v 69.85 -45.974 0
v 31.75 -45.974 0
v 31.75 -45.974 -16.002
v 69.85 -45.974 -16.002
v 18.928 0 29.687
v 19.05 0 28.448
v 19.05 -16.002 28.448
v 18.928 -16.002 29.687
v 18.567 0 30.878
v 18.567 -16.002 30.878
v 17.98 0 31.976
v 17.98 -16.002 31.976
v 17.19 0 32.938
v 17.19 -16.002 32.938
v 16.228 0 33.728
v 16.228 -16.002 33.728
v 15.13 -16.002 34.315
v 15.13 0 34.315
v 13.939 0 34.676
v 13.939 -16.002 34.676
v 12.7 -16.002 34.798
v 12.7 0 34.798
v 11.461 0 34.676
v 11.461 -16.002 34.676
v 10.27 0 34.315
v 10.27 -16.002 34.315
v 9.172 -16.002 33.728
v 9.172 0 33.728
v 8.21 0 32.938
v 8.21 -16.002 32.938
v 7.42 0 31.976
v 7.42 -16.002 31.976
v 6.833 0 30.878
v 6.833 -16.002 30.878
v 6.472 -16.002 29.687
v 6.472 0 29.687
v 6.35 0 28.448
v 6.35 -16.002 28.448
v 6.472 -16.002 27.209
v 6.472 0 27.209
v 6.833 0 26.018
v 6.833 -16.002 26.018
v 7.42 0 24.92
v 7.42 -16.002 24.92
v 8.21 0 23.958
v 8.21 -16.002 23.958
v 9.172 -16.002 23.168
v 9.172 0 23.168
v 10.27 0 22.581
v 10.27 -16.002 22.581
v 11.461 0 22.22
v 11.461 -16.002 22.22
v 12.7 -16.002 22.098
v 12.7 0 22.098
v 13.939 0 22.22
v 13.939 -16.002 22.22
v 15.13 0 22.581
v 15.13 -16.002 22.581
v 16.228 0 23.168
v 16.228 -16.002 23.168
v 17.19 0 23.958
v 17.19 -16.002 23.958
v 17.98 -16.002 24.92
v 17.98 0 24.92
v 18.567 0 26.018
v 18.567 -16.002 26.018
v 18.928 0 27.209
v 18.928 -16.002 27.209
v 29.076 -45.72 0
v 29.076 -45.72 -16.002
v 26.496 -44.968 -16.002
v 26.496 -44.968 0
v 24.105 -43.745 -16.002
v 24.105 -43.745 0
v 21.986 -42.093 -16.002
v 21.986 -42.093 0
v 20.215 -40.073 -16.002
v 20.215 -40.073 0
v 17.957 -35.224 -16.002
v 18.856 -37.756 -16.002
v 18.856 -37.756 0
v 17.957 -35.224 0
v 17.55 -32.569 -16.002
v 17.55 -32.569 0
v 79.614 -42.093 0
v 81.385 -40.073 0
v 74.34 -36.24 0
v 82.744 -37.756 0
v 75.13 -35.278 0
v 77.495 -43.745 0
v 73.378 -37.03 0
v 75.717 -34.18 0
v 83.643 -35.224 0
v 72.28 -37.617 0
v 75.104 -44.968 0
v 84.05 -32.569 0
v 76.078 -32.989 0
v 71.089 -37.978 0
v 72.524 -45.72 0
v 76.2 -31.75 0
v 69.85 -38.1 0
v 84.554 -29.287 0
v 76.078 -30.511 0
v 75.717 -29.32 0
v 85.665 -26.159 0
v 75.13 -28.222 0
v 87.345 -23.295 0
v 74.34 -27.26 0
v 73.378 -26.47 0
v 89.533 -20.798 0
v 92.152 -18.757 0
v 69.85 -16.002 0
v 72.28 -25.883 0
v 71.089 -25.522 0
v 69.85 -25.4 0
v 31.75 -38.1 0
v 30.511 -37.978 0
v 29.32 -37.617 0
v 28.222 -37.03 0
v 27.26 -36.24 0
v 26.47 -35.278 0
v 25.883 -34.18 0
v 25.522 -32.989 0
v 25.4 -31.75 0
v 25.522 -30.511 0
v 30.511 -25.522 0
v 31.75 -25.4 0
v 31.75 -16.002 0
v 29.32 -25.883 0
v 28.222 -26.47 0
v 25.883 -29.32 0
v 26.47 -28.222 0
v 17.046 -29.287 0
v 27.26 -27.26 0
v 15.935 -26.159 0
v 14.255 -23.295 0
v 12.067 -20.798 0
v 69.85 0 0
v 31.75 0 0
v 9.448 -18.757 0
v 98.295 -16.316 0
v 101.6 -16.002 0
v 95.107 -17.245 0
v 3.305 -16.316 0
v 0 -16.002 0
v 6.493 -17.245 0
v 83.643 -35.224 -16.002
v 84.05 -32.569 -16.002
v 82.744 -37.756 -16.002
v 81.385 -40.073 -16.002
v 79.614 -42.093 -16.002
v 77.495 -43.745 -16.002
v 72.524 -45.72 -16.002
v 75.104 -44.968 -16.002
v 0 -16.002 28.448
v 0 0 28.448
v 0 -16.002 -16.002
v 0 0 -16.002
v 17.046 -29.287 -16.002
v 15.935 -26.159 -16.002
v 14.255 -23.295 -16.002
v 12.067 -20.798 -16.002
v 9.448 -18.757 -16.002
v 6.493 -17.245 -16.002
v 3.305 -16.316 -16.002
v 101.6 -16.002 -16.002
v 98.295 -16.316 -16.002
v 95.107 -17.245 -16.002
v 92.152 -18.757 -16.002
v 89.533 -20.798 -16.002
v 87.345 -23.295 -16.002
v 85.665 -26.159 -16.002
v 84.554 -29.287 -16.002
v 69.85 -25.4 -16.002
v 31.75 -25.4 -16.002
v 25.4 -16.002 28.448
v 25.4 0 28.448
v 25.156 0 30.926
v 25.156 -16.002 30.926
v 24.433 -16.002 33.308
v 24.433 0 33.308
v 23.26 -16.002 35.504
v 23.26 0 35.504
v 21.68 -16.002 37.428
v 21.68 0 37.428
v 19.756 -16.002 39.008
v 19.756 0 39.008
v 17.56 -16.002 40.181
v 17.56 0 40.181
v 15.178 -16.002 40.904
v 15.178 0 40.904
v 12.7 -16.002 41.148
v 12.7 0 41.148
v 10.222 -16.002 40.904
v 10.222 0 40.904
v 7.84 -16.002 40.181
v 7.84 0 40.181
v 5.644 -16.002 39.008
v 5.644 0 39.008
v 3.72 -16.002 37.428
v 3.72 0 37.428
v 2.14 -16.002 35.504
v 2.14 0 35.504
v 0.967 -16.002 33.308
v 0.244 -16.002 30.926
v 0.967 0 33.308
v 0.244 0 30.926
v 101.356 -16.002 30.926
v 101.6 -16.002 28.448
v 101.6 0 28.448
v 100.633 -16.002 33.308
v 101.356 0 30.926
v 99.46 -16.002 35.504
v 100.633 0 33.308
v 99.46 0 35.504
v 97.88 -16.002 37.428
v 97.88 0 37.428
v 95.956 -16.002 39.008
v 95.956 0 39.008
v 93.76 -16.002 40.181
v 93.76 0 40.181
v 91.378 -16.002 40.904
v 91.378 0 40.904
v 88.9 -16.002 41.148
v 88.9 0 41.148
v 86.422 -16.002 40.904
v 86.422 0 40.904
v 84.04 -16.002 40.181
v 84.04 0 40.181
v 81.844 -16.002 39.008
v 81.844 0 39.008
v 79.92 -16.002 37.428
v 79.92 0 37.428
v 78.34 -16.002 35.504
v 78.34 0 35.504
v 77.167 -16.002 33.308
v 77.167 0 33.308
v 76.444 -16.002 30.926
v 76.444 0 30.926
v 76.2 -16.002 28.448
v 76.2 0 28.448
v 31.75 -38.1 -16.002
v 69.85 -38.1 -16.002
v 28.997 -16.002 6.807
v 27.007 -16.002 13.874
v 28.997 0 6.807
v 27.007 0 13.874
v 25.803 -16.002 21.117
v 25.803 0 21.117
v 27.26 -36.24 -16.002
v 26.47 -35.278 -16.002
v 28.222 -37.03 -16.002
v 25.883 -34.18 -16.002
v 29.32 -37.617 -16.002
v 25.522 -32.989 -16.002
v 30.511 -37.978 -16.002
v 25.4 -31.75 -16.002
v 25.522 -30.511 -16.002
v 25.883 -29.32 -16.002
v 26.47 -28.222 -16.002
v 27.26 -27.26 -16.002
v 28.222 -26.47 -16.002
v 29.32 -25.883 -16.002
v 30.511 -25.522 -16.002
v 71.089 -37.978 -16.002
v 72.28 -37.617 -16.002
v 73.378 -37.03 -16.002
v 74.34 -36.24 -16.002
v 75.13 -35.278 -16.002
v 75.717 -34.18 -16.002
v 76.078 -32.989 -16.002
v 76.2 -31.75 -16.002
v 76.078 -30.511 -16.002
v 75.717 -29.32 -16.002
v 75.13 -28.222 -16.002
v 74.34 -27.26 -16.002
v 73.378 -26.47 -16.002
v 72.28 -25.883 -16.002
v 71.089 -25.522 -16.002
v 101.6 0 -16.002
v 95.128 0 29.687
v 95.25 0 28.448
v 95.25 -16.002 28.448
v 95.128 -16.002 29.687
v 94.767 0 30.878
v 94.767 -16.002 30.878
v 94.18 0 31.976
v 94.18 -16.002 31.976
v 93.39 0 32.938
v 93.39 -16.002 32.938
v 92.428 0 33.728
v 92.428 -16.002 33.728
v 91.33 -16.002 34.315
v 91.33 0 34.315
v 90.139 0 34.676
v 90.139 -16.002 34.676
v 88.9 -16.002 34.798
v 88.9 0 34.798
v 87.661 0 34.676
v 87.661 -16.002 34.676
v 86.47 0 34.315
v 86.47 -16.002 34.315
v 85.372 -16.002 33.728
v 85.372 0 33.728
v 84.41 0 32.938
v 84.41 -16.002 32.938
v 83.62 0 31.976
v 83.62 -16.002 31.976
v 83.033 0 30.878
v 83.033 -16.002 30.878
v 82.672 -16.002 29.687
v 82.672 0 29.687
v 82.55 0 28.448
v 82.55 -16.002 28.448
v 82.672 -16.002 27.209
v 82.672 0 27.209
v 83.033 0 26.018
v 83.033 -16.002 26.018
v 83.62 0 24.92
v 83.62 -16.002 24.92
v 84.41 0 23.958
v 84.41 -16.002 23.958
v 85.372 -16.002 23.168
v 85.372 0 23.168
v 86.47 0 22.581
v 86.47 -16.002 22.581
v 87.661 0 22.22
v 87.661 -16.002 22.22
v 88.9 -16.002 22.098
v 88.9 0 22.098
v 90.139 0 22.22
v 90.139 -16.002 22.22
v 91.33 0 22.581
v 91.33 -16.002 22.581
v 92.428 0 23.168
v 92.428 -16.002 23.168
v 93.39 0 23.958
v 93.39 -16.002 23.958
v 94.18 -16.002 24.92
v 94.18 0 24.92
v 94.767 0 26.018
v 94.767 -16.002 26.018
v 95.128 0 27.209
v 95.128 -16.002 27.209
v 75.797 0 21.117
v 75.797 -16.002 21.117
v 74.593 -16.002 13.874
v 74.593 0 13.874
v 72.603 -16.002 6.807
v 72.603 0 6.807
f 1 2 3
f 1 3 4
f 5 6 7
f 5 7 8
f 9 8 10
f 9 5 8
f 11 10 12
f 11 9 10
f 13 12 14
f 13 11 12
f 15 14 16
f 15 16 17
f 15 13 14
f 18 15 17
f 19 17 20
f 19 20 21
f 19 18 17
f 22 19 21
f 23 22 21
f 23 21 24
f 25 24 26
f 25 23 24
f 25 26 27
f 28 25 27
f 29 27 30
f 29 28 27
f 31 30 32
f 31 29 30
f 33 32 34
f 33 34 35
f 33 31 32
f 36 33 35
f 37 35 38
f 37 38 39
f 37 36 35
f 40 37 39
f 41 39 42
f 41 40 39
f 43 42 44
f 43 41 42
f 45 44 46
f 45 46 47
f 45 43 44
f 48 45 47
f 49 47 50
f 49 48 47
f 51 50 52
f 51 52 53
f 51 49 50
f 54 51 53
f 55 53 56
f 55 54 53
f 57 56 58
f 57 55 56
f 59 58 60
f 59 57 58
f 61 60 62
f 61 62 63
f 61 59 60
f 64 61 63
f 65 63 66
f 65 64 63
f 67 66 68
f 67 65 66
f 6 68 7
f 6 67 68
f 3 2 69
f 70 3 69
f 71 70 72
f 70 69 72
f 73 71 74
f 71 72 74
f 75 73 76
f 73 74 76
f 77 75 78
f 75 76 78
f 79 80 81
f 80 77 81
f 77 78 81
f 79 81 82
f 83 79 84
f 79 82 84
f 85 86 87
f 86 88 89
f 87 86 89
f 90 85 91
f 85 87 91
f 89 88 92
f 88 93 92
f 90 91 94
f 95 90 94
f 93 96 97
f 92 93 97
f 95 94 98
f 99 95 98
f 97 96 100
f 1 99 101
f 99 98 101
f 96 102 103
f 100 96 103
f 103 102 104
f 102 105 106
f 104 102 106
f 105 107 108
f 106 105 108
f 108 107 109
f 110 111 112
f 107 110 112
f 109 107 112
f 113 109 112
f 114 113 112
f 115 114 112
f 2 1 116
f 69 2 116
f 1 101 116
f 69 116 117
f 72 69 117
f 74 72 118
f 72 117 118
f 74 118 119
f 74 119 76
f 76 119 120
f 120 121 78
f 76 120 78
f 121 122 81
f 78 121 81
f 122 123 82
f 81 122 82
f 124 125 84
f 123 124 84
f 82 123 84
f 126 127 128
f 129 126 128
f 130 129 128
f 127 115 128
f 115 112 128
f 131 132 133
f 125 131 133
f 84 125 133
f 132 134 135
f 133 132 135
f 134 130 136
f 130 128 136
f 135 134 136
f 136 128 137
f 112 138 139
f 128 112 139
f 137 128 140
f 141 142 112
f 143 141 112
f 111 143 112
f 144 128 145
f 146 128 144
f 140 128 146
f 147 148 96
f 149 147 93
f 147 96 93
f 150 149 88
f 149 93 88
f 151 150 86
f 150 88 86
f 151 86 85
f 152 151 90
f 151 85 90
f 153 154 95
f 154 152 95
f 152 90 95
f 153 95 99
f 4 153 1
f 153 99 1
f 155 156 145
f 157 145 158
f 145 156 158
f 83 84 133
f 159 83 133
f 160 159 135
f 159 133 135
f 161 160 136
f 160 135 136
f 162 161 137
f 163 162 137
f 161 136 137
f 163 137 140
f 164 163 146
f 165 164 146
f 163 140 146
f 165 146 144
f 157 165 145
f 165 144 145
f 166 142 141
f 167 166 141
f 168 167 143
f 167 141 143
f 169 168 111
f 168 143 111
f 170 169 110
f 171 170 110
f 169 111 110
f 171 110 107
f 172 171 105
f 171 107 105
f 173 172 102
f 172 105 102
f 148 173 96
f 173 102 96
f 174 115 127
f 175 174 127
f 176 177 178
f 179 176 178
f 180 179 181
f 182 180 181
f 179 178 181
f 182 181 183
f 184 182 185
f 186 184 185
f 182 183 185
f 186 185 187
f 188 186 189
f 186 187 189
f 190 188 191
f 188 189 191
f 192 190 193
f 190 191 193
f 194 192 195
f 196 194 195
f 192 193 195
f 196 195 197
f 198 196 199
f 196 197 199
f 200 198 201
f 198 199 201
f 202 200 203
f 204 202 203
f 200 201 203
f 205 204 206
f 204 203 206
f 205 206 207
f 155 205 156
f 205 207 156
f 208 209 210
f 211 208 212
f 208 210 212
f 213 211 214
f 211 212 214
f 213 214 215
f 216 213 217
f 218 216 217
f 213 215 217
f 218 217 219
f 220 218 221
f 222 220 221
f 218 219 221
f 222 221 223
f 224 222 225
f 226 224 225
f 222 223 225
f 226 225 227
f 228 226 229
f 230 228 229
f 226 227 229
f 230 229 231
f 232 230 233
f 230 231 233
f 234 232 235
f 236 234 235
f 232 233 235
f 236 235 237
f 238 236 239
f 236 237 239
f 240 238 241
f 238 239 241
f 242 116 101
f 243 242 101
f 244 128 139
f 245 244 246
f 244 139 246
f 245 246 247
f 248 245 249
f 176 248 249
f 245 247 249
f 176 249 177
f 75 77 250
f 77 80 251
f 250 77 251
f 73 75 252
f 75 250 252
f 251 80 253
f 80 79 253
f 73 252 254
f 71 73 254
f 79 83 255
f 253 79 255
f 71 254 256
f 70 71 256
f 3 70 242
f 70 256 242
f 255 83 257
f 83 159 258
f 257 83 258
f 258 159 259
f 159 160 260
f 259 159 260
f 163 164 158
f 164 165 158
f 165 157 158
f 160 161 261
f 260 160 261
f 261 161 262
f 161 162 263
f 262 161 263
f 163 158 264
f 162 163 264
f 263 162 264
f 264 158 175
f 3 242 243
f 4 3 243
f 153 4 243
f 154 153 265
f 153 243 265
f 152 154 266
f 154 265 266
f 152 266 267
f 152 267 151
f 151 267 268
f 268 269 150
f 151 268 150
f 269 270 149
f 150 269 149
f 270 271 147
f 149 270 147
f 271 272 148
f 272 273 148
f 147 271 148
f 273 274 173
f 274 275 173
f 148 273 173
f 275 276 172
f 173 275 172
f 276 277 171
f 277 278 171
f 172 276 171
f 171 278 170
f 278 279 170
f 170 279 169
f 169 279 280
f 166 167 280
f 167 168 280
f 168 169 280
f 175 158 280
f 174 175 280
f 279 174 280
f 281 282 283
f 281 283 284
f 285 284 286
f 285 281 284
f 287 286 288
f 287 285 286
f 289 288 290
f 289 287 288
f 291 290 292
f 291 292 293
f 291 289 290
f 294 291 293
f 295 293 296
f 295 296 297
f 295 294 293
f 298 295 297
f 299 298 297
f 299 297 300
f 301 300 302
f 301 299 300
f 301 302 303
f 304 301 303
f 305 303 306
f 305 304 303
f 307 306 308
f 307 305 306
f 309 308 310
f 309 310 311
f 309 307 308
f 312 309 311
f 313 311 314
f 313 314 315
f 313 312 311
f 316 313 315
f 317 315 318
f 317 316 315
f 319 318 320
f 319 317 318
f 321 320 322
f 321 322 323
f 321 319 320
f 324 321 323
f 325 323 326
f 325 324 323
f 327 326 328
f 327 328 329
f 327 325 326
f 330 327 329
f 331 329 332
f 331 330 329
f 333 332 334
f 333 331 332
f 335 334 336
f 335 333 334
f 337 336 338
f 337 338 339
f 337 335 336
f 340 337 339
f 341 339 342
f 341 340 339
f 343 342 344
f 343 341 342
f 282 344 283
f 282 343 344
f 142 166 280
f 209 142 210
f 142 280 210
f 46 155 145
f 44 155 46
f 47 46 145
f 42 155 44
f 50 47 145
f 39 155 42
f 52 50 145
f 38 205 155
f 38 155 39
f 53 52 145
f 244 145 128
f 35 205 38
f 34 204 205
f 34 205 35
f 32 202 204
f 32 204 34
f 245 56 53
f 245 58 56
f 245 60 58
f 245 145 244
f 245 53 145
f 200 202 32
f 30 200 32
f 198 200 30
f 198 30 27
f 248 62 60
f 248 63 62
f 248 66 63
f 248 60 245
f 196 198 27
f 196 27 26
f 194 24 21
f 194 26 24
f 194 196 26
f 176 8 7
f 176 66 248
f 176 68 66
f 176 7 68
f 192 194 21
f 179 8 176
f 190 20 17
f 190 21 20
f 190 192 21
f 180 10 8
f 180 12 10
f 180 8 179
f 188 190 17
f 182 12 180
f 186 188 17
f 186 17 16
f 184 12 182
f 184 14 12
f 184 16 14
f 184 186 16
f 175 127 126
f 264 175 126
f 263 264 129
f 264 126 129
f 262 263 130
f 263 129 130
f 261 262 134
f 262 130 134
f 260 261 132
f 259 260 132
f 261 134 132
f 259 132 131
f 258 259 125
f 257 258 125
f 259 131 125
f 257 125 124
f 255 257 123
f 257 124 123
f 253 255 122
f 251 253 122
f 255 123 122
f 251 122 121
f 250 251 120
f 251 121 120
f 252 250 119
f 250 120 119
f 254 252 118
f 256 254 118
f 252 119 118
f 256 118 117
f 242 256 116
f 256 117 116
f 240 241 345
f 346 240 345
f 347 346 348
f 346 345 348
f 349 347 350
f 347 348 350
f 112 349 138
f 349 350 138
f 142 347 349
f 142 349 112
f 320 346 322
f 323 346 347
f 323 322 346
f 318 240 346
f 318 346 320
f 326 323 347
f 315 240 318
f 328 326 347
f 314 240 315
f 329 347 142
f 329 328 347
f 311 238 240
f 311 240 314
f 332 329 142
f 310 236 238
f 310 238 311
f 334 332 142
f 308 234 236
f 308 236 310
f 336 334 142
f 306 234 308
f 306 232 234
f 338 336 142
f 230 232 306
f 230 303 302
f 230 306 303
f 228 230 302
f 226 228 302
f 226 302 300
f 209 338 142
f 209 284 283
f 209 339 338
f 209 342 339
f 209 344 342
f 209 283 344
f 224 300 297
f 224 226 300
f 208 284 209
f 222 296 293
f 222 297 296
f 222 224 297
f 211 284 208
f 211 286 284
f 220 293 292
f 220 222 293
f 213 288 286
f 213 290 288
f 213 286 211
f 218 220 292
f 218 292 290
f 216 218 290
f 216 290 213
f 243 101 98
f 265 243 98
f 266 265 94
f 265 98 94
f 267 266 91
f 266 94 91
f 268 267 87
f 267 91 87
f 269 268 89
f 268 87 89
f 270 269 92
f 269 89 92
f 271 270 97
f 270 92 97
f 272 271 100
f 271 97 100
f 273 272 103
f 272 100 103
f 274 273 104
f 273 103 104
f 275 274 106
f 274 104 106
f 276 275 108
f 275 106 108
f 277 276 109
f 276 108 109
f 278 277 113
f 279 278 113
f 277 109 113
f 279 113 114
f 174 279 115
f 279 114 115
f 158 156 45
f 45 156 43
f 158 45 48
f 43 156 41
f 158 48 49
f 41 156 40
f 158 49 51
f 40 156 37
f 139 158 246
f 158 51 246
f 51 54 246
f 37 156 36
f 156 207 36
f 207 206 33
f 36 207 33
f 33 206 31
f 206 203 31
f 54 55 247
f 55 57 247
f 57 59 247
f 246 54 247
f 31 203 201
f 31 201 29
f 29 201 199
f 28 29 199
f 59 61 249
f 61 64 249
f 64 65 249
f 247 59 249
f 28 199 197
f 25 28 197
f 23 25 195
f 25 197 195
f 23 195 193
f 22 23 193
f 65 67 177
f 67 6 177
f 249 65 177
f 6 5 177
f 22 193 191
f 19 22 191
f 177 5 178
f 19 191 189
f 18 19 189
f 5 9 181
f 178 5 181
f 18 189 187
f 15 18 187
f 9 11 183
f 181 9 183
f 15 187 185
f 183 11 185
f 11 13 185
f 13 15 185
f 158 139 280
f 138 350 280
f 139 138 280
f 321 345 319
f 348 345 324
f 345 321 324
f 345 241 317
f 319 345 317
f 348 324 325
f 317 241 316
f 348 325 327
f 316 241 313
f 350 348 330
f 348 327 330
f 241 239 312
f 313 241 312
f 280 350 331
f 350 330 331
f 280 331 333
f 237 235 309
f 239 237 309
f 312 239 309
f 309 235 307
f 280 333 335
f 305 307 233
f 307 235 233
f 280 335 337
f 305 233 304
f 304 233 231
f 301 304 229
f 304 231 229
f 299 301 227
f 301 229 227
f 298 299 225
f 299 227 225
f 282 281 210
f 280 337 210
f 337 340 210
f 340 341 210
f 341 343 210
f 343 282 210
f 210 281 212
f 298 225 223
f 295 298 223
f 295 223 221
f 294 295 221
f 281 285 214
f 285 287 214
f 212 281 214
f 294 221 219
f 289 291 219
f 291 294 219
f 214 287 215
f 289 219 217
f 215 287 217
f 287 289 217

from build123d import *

# Parameters (mm, degrees)
F0_R     = 6.35
F1_DEPTH = 16.002
F2_DEPTH = 45.974
F4_DEPTH = 25.4
F5_DEPTH = 25.4


with BuildPart() as f1:
    # F0 (on Front) → F1 (new body)
    with BuildSketch(Plane.XZ):
        with BuildLine():
            ThreePointArc((76.2, 28.448), (74.593204, 13.873955), (69.85, 0))
            Line((69.85, 0), (101.6, 0))
            Line((101.6, 0), (101.6, 28.448))
            ThreePointArc((101.6, 28.448), (88.9, 41.148), (76.2, 28.448))
        make_face()
        with Locations((88.9, 28.448)):
            Circle(F0_R, mode=Mode.SUBTRACT)
        with BuildLine():
            Line((0, 28.448), (0, 0))
            Line((0, 0), (31.75, 0))
            ThreePointArc((31.75, 0), (27.006796, 13.873955), (25.4, 28.448))
            ThreePointArc((25.4, 28.448), (12.7, 41.148), (0, 28.448))
        make_face()
        with Locations((12.7, 28.448)):
            Circle(F0_R, mode=Mode.SUBTRACT)
    extrude(amount=F1_DEPTH)

    # F0 (on Front) → F2 (join)
    with BuildSketch(Plane.XZ):
        Polygon((31.75, 0), (0, 0), (0, -16.002), (101.6, -16.002), (101.6, 0), (69.85, 0), align=None)
    extrude(amount=F2_DEPTH)

    # F3 (on face) → F4 (cut)
    with BuildSketch(Plane.XY):
        with BuildLine():
            ThreePointArc((31.75, -45.974), (21.985897, -42.09333), (17.549587, -32.56881))
            ThreePointArc((17.549587, -32.56881), (12.066972, -20.797928), (0, -16.002))
            Line((0, -16.002), (0, -45.974))
            Line((0, -45.974), (31.75, -45.974))
        make_face()
        with BuildLine():
            ThreePointArc((84.050413, -32.56881), (79.614103, -42.09333), (69.85, -45.974))
            Line((69.85, -45.974), (101.6, -45.974))
            Line((101.6, -45.974), (101.6, -16.002))
            ThreePointArc((101.6, -16.002), (89.533028, -20.797928), (84.050413, -32.56881))
        make_face()
    extrude(amount=-F4_DEPTH, mode=Mode.SUBTRACT)

    # F3 (on face) → F5 (cut)
    with BuildSketch(Plane.XY):
        with BuildLine():
            Line((31.75, -38.1), (69.85, -38.1))
            ThreePointArc((69.85, -38.1), (76.2, -31.75), (69.85, -25.4))
            Line((69.85, -25.4), (31.75, -25.4))
            ThreePointArc((31.75, -25.4), (25.4, -31.75), (31.75, -38.1))
        make_face()
    extrude(amount=-F5_DEPTH, mode=Mode.SUBTRACT)


solid = f1.part
